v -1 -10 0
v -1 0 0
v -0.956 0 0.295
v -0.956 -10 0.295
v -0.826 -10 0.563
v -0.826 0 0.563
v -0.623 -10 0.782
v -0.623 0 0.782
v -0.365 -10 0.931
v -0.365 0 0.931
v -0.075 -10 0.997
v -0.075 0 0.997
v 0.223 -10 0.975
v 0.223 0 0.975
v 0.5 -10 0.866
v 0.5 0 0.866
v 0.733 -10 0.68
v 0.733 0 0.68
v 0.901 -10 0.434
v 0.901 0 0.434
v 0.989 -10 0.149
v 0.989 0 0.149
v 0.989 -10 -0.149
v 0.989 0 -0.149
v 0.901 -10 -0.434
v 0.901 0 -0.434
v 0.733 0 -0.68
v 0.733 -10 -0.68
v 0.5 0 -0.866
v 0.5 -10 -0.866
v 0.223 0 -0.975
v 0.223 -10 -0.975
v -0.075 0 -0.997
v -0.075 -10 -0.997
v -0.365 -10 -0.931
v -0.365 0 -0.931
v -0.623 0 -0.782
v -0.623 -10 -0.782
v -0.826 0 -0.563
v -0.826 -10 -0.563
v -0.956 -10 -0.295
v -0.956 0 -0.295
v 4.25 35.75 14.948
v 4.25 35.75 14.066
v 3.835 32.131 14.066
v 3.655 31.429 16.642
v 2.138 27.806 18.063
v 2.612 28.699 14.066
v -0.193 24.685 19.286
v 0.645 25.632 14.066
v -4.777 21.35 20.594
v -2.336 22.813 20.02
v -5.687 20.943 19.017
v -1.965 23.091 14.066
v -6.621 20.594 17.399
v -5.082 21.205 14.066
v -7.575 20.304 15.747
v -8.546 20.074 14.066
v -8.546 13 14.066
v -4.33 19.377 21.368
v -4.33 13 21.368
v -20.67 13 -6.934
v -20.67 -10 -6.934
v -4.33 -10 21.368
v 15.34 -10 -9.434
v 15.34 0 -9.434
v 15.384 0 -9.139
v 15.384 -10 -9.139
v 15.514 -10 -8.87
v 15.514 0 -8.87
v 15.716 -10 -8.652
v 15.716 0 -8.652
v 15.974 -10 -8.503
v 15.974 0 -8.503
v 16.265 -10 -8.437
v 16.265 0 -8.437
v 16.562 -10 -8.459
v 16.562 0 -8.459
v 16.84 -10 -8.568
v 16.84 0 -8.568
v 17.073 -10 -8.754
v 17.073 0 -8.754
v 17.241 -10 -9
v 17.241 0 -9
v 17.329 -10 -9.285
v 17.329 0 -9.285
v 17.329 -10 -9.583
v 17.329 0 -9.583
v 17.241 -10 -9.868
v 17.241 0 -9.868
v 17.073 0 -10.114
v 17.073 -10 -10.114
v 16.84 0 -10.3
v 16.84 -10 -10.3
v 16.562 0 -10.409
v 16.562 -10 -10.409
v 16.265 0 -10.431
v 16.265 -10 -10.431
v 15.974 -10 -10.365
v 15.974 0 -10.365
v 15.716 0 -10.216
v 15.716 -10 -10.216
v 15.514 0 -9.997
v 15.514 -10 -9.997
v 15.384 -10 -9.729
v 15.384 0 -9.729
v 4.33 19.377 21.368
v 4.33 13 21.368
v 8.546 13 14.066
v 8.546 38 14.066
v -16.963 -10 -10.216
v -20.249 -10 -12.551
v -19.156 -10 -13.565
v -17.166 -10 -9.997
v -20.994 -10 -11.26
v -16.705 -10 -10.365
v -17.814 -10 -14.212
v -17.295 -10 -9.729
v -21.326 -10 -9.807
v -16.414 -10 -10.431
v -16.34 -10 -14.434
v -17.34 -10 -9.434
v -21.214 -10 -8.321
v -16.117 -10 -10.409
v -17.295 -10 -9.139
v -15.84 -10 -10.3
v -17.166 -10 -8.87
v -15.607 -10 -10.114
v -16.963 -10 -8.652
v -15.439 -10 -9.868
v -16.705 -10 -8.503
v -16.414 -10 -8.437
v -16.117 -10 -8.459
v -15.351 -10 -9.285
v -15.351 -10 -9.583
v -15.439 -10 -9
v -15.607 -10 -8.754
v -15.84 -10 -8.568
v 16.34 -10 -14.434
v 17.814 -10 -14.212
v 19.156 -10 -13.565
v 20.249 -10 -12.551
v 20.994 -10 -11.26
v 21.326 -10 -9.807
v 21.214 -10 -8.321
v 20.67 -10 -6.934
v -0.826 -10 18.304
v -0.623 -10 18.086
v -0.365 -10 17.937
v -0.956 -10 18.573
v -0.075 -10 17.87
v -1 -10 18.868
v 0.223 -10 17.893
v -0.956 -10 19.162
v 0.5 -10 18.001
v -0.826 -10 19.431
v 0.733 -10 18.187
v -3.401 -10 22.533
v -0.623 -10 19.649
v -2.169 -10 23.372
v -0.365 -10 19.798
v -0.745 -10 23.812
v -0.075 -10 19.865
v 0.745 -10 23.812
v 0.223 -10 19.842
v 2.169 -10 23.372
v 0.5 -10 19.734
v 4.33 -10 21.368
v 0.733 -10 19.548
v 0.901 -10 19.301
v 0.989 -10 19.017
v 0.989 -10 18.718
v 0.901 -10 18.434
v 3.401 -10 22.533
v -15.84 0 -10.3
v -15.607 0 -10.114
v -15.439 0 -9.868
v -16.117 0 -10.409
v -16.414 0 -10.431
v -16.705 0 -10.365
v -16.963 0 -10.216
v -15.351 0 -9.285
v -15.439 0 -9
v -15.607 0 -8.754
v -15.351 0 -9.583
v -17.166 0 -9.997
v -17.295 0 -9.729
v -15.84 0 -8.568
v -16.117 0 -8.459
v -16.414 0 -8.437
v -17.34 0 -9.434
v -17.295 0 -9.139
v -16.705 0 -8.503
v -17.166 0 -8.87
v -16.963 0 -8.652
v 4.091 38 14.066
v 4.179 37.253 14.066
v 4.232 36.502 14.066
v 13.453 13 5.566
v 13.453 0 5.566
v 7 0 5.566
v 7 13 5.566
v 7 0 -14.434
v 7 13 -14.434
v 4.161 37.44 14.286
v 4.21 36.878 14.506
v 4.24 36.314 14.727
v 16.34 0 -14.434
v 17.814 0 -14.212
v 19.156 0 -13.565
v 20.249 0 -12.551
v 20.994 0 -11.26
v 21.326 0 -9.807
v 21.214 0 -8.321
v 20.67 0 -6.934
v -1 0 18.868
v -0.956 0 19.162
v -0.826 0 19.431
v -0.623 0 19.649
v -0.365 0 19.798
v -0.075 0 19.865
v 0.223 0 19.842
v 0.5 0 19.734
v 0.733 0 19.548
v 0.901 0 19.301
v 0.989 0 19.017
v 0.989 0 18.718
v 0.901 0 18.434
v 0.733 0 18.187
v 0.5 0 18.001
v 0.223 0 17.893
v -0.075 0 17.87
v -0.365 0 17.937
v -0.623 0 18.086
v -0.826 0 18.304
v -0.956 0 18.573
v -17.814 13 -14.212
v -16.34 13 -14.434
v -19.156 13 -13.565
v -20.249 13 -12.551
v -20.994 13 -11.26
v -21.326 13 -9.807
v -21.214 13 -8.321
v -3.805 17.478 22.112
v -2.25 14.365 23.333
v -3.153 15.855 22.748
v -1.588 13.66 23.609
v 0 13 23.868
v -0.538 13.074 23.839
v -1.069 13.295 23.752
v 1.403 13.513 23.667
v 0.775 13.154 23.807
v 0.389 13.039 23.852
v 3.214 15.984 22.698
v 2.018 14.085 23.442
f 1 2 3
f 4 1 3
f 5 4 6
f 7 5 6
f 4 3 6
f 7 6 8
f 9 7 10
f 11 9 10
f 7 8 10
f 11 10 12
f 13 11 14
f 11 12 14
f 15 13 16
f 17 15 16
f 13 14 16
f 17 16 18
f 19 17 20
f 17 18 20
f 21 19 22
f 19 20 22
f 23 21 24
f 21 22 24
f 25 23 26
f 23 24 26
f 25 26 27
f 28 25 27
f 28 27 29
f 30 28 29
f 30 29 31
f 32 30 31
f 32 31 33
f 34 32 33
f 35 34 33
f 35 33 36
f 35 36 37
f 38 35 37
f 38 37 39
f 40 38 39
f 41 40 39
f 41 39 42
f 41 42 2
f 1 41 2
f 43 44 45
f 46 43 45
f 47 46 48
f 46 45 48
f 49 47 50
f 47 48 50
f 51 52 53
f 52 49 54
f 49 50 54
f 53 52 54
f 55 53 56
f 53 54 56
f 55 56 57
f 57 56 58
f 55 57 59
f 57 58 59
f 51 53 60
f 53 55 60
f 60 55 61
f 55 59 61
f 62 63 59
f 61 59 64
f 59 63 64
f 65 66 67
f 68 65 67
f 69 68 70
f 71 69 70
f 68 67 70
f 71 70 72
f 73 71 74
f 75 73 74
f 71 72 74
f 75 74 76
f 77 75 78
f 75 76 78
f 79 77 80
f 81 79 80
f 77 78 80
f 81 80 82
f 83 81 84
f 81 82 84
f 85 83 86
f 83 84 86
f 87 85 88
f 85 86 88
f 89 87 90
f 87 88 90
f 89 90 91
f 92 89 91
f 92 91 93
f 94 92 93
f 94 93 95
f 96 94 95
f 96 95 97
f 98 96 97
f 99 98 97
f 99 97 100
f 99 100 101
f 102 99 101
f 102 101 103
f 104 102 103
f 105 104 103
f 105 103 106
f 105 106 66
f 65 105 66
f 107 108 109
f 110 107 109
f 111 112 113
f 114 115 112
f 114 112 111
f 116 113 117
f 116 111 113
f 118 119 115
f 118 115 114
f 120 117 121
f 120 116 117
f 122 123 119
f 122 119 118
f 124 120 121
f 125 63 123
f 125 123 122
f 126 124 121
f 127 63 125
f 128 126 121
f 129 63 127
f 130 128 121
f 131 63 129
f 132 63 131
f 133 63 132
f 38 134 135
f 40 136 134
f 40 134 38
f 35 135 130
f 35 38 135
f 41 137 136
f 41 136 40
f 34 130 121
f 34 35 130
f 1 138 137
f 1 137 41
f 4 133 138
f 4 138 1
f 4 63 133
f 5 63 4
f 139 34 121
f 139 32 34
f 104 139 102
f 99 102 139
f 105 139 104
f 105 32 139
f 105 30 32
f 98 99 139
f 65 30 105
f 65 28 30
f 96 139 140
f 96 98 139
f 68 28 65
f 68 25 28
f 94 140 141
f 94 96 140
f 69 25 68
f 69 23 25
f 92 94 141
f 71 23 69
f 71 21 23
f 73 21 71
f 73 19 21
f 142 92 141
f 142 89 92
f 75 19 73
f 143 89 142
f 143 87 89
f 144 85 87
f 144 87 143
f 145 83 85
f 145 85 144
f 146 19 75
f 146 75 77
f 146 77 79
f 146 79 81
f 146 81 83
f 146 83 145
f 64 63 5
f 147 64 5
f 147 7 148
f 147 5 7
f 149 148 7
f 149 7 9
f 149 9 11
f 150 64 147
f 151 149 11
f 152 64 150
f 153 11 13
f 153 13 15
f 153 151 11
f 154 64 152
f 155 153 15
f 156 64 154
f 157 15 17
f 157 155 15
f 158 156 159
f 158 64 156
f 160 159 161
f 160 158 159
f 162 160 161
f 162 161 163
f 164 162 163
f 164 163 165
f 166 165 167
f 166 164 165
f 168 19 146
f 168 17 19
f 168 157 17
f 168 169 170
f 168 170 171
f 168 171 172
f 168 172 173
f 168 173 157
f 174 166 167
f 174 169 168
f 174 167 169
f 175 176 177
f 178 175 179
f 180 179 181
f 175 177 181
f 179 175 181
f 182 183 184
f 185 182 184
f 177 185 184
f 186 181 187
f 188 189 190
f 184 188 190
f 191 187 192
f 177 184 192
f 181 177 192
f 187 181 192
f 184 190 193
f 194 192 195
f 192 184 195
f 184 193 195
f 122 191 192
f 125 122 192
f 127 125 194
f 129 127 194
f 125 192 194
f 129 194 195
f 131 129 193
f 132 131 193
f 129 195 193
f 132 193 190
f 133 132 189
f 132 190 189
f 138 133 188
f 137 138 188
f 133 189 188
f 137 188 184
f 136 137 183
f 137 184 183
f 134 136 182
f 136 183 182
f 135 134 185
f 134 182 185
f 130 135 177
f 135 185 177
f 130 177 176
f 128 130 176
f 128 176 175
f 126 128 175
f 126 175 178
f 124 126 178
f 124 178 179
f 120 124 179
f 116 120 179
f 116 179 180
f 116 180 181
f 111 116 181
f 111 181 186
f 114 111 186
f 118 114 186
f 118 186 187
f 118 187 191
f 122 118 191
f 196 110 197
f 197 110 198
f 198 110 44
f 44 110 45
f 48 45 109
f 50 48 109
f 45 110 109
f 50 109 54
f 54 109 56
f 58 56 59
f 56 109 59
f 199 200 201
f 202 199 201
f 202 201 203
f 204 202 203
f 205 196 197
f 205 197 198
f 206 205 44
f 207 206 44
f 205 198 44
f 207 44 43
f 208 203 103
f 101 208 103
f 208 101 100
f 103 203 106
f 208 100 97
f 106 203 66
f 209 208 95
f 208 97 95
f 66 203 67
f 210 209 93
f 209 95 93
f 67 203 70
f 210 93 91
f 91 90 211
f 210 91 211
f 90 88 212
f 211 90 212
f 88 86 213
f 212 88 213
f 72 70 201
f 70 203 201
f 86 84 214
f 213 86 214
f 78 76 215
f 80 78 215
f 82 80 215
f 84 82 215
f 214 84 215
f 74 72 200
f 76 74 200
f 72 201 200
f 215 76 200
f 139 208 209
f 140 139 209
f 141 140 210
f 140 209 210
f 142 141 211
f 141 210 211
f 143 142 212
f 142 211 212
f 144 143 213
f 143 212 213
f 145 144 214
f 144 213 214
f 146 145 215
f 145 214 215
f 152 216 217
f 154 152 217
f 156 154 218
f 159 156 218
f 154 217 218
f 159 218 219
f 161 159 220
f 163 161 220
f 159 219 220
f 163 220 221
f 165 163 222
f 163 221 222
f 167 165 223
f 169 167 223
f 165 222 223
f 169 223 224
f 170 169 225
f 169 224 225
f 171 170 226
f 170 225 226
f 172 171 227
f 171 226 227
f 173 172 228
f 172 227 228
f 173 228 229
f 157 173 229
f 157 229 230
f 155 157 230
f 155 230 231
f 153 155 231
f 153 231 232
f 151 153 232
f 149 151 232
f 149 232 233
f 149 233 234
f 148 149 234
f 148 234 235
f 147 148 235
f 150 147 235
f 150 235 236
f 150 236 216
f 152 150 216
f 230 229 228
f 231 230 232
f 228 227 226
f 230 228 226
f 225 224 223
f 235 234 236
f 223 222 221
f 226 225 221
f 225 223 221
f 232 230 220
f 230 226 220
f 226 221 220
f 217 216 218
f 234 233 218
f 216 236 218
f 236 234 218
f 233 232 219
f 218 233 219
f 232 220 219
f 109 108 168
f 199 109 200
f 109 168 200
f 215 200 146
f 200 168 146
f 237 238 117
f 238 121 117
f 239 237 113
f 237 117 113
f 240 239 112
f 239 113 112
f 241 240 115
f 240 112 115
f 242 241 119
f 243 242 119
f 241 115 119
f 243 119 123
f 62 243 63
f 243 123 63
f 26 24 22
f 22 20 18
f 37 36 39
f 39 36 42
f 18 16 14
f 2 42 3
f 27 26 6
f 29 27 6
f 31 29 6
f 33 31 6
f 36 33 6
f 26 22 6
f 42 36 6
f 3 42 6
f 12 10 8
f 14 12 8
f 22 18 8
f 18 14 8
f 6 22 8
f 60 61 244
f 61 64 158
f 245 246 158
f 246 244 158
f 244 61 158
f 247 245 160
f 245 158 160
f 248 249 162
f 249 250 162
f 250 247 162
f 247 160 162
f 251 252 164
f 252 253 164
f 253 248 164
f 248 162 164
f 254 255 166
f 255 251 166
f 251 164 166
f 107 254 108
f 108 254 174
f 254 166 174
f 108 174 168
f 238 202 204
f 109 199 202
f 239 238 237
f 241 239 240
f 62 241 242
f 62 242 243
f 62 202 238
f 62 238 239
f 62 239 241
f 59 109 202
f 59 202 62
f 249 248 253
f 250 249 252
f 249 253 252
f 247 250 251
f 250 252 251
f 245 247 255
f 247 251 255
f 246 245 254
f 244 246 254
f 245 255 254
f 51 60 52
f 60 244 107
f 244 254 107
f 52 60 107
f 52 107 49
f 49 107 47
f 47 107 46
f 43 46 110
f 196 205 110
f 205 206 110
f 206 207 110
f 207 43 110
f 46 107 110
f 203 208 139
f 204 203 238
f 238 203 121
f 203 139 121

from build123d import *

# Parameters (mm, degrees)
F1_DEPTH  = 10
F3_D      = 2
F3_DEPTH  = 12
F3_TIP    = 0.600860619
F4_R      = 1
F5_DEPTH  = 13
F7_DEPTH  = 25
F9_DEPTH  = 9.8022701892
F11_DEPTH = 12.5


with BuildPart() as f1:
    # F0 (on Front) → F1 (new body)
    with BuildSketch(Plane.XZ):
        with BuildLine():
            Line((-4.3301270189, 21.3675134595), (-20.6698729811, -6.9337567297))
            ThreePointArc((-20.6698729811, -6.9337567297), (-20.6698729811, -11.9337567297), (-16.3397459622, -14.4337567297))
            Line((-16.3397459622, -14.4337567297), (16.3397459622, -14.4337567297))
            ThreePointArc((16.3397459622, -14.4337567297), (20.6698729811, -11.9337567297), (20.6698729811, -6.9337567297))
            Line((20.6698729811, -6.9337567297), (4.3301270189, 21.3675134595))
            ThreePointArc((4.3301270189, 21.3675134595), (0, 23.8675134595), (-4.3301270189, 21.3675134595))
        make_face()
    extrude(amount=F1_DEPTH)

    # F3
    with Locations(Plane.XZ.offset(10)):
        with Locations((0, 18.8675134595), (0, 0), (16.3397459622, -9.4337567297), (-16.3397459622, -9.4337567297)):
            Hole(F3_D / 2, depth=F3_DEPTH)
            with Locations((0, 0, -(F3_DEPTH + F3_TIP / 2))):  # 118° drill point
                Cone(0, F3_D / 2, F3_TIP, mode=Mode.SUBTRACT)

    # F4 (on face) → F5 (join)
    with BuildSketch(Plane(origin=(0, 0, 0), x_dir=(-1, 0, 0), z_dir=(0, 1, 0))):
        with BuildLine():
            Line((-7, 5.5662432703), (-7, -14.4337567297))
            Line((-7, -14.4337567297), (16.3397459622, -14.4337567297))
            ThreePointArc((16.3397459622, -14.4337567297), (20.6698729811, -11.9337567297), (20.6698729811, -6.9337567297))
            Line((20.6698729811, -6.9337567297), (4.3301270189, 21.3675134595))
            ThreePointArc((4.3301270189, 21.3675134595), (0, 23.8675134595), (-4.3301270189, 21.3675134595))
            Line((-4.3301270189, 21.3675134595), (-13.4529946162, 5.5662432703))
            Line((-13.4529946162, 5.5662432703), (-7, 5.5662432703))
        make_face()
        with Locations((16.3397459622, -9.4337567297)):
            Circle(F4_R, mode=Mode.SUBTRACT)
        Circle(F4_R, mode=Mode.SUBTRACT)
        with Locations((0, 18.8675134595)):
            Circle(F4_R, mode=Mode.SUBTRACT)
        with Locations((16.3397459622, -9.4337567297)):
            Circle(F4_R)
        Circle(F4_R)
        with Locations((0, 18.8675134595)):
            Circle(F4_R)
    extrude(amount=F5_DEPTH)

    # F6 (on face) → F7 (join)
    with BuildSketch(Plane(origin=(0, 13, 0), x_dir=(-1, 0, 0), z_dir=(0, 1, 0))):
        with BuildLine():
            Line((8.5455173281, 14.0662432703), (4.3301270189, 21.3675134595))
            ThreePointArc((4.3301270189, 21.3675134595), (0, 23.8675134595), (-4.3301270189, 21.3675134595))
            Line((-4.3301270189, 21.3675134595), (-8.5455173281, 14.0662432703))
            Line((-8.5455173281, 14.0662432703), (8.5455173281, 14.0662432703))
        make_face()
    extrude(amount=F7_DEPTH)

    # F8 (on face) → F9 (cut, through all)
    with BuildSketch(Plane(origin=(0, 0, 14.0662432703), x_dir=(1, 0, 0), z_dir=(0, 0, -1))):
        with BuildLine():
            Line((-8.5455173281, -38), (-8.5455173281, -20.0741813354))
            ThreePointArc((-8.5455173281, -20.0741813354), (-24.827324347, -44.9686543445), (4.0910069124, -38))
            Line((4.0910069124, -38), (-8.5455173281, -38))
        make_face()
        with BuildLine():
            ThreePointArc((4.0910069124, -38), (4.2102022324, -36.8778052582), (4.25, -35.75))
            ThreePointArc((4.25, -35.75), (0.6449933996, -25.6324835743), (-8.5455173281, -20.0741813354))
            Line((-8.5455173281, -20.0741813354), (-8.5455173281, -38))
            Line((-8.5455173281, -38), (4.0910069124, -38))
        make_face()
    extrude(amount=-F9_DEPTH, mode=Mode.SUBTRACT)

    # F10 (on Right) → F11 (cut, symmetric)
    with BuildSketch(Plane.YZ):
        Polygon((13, 23.8675134595), (38, 14.0662432703), (39, 14.0662432703), (39, 24.8675134595), (13, 24.8675134595), align=None)
    extrude(amount=F11_DEPTH, both=True, mode=Mode.SUBTRACT)


solid = f1.part
